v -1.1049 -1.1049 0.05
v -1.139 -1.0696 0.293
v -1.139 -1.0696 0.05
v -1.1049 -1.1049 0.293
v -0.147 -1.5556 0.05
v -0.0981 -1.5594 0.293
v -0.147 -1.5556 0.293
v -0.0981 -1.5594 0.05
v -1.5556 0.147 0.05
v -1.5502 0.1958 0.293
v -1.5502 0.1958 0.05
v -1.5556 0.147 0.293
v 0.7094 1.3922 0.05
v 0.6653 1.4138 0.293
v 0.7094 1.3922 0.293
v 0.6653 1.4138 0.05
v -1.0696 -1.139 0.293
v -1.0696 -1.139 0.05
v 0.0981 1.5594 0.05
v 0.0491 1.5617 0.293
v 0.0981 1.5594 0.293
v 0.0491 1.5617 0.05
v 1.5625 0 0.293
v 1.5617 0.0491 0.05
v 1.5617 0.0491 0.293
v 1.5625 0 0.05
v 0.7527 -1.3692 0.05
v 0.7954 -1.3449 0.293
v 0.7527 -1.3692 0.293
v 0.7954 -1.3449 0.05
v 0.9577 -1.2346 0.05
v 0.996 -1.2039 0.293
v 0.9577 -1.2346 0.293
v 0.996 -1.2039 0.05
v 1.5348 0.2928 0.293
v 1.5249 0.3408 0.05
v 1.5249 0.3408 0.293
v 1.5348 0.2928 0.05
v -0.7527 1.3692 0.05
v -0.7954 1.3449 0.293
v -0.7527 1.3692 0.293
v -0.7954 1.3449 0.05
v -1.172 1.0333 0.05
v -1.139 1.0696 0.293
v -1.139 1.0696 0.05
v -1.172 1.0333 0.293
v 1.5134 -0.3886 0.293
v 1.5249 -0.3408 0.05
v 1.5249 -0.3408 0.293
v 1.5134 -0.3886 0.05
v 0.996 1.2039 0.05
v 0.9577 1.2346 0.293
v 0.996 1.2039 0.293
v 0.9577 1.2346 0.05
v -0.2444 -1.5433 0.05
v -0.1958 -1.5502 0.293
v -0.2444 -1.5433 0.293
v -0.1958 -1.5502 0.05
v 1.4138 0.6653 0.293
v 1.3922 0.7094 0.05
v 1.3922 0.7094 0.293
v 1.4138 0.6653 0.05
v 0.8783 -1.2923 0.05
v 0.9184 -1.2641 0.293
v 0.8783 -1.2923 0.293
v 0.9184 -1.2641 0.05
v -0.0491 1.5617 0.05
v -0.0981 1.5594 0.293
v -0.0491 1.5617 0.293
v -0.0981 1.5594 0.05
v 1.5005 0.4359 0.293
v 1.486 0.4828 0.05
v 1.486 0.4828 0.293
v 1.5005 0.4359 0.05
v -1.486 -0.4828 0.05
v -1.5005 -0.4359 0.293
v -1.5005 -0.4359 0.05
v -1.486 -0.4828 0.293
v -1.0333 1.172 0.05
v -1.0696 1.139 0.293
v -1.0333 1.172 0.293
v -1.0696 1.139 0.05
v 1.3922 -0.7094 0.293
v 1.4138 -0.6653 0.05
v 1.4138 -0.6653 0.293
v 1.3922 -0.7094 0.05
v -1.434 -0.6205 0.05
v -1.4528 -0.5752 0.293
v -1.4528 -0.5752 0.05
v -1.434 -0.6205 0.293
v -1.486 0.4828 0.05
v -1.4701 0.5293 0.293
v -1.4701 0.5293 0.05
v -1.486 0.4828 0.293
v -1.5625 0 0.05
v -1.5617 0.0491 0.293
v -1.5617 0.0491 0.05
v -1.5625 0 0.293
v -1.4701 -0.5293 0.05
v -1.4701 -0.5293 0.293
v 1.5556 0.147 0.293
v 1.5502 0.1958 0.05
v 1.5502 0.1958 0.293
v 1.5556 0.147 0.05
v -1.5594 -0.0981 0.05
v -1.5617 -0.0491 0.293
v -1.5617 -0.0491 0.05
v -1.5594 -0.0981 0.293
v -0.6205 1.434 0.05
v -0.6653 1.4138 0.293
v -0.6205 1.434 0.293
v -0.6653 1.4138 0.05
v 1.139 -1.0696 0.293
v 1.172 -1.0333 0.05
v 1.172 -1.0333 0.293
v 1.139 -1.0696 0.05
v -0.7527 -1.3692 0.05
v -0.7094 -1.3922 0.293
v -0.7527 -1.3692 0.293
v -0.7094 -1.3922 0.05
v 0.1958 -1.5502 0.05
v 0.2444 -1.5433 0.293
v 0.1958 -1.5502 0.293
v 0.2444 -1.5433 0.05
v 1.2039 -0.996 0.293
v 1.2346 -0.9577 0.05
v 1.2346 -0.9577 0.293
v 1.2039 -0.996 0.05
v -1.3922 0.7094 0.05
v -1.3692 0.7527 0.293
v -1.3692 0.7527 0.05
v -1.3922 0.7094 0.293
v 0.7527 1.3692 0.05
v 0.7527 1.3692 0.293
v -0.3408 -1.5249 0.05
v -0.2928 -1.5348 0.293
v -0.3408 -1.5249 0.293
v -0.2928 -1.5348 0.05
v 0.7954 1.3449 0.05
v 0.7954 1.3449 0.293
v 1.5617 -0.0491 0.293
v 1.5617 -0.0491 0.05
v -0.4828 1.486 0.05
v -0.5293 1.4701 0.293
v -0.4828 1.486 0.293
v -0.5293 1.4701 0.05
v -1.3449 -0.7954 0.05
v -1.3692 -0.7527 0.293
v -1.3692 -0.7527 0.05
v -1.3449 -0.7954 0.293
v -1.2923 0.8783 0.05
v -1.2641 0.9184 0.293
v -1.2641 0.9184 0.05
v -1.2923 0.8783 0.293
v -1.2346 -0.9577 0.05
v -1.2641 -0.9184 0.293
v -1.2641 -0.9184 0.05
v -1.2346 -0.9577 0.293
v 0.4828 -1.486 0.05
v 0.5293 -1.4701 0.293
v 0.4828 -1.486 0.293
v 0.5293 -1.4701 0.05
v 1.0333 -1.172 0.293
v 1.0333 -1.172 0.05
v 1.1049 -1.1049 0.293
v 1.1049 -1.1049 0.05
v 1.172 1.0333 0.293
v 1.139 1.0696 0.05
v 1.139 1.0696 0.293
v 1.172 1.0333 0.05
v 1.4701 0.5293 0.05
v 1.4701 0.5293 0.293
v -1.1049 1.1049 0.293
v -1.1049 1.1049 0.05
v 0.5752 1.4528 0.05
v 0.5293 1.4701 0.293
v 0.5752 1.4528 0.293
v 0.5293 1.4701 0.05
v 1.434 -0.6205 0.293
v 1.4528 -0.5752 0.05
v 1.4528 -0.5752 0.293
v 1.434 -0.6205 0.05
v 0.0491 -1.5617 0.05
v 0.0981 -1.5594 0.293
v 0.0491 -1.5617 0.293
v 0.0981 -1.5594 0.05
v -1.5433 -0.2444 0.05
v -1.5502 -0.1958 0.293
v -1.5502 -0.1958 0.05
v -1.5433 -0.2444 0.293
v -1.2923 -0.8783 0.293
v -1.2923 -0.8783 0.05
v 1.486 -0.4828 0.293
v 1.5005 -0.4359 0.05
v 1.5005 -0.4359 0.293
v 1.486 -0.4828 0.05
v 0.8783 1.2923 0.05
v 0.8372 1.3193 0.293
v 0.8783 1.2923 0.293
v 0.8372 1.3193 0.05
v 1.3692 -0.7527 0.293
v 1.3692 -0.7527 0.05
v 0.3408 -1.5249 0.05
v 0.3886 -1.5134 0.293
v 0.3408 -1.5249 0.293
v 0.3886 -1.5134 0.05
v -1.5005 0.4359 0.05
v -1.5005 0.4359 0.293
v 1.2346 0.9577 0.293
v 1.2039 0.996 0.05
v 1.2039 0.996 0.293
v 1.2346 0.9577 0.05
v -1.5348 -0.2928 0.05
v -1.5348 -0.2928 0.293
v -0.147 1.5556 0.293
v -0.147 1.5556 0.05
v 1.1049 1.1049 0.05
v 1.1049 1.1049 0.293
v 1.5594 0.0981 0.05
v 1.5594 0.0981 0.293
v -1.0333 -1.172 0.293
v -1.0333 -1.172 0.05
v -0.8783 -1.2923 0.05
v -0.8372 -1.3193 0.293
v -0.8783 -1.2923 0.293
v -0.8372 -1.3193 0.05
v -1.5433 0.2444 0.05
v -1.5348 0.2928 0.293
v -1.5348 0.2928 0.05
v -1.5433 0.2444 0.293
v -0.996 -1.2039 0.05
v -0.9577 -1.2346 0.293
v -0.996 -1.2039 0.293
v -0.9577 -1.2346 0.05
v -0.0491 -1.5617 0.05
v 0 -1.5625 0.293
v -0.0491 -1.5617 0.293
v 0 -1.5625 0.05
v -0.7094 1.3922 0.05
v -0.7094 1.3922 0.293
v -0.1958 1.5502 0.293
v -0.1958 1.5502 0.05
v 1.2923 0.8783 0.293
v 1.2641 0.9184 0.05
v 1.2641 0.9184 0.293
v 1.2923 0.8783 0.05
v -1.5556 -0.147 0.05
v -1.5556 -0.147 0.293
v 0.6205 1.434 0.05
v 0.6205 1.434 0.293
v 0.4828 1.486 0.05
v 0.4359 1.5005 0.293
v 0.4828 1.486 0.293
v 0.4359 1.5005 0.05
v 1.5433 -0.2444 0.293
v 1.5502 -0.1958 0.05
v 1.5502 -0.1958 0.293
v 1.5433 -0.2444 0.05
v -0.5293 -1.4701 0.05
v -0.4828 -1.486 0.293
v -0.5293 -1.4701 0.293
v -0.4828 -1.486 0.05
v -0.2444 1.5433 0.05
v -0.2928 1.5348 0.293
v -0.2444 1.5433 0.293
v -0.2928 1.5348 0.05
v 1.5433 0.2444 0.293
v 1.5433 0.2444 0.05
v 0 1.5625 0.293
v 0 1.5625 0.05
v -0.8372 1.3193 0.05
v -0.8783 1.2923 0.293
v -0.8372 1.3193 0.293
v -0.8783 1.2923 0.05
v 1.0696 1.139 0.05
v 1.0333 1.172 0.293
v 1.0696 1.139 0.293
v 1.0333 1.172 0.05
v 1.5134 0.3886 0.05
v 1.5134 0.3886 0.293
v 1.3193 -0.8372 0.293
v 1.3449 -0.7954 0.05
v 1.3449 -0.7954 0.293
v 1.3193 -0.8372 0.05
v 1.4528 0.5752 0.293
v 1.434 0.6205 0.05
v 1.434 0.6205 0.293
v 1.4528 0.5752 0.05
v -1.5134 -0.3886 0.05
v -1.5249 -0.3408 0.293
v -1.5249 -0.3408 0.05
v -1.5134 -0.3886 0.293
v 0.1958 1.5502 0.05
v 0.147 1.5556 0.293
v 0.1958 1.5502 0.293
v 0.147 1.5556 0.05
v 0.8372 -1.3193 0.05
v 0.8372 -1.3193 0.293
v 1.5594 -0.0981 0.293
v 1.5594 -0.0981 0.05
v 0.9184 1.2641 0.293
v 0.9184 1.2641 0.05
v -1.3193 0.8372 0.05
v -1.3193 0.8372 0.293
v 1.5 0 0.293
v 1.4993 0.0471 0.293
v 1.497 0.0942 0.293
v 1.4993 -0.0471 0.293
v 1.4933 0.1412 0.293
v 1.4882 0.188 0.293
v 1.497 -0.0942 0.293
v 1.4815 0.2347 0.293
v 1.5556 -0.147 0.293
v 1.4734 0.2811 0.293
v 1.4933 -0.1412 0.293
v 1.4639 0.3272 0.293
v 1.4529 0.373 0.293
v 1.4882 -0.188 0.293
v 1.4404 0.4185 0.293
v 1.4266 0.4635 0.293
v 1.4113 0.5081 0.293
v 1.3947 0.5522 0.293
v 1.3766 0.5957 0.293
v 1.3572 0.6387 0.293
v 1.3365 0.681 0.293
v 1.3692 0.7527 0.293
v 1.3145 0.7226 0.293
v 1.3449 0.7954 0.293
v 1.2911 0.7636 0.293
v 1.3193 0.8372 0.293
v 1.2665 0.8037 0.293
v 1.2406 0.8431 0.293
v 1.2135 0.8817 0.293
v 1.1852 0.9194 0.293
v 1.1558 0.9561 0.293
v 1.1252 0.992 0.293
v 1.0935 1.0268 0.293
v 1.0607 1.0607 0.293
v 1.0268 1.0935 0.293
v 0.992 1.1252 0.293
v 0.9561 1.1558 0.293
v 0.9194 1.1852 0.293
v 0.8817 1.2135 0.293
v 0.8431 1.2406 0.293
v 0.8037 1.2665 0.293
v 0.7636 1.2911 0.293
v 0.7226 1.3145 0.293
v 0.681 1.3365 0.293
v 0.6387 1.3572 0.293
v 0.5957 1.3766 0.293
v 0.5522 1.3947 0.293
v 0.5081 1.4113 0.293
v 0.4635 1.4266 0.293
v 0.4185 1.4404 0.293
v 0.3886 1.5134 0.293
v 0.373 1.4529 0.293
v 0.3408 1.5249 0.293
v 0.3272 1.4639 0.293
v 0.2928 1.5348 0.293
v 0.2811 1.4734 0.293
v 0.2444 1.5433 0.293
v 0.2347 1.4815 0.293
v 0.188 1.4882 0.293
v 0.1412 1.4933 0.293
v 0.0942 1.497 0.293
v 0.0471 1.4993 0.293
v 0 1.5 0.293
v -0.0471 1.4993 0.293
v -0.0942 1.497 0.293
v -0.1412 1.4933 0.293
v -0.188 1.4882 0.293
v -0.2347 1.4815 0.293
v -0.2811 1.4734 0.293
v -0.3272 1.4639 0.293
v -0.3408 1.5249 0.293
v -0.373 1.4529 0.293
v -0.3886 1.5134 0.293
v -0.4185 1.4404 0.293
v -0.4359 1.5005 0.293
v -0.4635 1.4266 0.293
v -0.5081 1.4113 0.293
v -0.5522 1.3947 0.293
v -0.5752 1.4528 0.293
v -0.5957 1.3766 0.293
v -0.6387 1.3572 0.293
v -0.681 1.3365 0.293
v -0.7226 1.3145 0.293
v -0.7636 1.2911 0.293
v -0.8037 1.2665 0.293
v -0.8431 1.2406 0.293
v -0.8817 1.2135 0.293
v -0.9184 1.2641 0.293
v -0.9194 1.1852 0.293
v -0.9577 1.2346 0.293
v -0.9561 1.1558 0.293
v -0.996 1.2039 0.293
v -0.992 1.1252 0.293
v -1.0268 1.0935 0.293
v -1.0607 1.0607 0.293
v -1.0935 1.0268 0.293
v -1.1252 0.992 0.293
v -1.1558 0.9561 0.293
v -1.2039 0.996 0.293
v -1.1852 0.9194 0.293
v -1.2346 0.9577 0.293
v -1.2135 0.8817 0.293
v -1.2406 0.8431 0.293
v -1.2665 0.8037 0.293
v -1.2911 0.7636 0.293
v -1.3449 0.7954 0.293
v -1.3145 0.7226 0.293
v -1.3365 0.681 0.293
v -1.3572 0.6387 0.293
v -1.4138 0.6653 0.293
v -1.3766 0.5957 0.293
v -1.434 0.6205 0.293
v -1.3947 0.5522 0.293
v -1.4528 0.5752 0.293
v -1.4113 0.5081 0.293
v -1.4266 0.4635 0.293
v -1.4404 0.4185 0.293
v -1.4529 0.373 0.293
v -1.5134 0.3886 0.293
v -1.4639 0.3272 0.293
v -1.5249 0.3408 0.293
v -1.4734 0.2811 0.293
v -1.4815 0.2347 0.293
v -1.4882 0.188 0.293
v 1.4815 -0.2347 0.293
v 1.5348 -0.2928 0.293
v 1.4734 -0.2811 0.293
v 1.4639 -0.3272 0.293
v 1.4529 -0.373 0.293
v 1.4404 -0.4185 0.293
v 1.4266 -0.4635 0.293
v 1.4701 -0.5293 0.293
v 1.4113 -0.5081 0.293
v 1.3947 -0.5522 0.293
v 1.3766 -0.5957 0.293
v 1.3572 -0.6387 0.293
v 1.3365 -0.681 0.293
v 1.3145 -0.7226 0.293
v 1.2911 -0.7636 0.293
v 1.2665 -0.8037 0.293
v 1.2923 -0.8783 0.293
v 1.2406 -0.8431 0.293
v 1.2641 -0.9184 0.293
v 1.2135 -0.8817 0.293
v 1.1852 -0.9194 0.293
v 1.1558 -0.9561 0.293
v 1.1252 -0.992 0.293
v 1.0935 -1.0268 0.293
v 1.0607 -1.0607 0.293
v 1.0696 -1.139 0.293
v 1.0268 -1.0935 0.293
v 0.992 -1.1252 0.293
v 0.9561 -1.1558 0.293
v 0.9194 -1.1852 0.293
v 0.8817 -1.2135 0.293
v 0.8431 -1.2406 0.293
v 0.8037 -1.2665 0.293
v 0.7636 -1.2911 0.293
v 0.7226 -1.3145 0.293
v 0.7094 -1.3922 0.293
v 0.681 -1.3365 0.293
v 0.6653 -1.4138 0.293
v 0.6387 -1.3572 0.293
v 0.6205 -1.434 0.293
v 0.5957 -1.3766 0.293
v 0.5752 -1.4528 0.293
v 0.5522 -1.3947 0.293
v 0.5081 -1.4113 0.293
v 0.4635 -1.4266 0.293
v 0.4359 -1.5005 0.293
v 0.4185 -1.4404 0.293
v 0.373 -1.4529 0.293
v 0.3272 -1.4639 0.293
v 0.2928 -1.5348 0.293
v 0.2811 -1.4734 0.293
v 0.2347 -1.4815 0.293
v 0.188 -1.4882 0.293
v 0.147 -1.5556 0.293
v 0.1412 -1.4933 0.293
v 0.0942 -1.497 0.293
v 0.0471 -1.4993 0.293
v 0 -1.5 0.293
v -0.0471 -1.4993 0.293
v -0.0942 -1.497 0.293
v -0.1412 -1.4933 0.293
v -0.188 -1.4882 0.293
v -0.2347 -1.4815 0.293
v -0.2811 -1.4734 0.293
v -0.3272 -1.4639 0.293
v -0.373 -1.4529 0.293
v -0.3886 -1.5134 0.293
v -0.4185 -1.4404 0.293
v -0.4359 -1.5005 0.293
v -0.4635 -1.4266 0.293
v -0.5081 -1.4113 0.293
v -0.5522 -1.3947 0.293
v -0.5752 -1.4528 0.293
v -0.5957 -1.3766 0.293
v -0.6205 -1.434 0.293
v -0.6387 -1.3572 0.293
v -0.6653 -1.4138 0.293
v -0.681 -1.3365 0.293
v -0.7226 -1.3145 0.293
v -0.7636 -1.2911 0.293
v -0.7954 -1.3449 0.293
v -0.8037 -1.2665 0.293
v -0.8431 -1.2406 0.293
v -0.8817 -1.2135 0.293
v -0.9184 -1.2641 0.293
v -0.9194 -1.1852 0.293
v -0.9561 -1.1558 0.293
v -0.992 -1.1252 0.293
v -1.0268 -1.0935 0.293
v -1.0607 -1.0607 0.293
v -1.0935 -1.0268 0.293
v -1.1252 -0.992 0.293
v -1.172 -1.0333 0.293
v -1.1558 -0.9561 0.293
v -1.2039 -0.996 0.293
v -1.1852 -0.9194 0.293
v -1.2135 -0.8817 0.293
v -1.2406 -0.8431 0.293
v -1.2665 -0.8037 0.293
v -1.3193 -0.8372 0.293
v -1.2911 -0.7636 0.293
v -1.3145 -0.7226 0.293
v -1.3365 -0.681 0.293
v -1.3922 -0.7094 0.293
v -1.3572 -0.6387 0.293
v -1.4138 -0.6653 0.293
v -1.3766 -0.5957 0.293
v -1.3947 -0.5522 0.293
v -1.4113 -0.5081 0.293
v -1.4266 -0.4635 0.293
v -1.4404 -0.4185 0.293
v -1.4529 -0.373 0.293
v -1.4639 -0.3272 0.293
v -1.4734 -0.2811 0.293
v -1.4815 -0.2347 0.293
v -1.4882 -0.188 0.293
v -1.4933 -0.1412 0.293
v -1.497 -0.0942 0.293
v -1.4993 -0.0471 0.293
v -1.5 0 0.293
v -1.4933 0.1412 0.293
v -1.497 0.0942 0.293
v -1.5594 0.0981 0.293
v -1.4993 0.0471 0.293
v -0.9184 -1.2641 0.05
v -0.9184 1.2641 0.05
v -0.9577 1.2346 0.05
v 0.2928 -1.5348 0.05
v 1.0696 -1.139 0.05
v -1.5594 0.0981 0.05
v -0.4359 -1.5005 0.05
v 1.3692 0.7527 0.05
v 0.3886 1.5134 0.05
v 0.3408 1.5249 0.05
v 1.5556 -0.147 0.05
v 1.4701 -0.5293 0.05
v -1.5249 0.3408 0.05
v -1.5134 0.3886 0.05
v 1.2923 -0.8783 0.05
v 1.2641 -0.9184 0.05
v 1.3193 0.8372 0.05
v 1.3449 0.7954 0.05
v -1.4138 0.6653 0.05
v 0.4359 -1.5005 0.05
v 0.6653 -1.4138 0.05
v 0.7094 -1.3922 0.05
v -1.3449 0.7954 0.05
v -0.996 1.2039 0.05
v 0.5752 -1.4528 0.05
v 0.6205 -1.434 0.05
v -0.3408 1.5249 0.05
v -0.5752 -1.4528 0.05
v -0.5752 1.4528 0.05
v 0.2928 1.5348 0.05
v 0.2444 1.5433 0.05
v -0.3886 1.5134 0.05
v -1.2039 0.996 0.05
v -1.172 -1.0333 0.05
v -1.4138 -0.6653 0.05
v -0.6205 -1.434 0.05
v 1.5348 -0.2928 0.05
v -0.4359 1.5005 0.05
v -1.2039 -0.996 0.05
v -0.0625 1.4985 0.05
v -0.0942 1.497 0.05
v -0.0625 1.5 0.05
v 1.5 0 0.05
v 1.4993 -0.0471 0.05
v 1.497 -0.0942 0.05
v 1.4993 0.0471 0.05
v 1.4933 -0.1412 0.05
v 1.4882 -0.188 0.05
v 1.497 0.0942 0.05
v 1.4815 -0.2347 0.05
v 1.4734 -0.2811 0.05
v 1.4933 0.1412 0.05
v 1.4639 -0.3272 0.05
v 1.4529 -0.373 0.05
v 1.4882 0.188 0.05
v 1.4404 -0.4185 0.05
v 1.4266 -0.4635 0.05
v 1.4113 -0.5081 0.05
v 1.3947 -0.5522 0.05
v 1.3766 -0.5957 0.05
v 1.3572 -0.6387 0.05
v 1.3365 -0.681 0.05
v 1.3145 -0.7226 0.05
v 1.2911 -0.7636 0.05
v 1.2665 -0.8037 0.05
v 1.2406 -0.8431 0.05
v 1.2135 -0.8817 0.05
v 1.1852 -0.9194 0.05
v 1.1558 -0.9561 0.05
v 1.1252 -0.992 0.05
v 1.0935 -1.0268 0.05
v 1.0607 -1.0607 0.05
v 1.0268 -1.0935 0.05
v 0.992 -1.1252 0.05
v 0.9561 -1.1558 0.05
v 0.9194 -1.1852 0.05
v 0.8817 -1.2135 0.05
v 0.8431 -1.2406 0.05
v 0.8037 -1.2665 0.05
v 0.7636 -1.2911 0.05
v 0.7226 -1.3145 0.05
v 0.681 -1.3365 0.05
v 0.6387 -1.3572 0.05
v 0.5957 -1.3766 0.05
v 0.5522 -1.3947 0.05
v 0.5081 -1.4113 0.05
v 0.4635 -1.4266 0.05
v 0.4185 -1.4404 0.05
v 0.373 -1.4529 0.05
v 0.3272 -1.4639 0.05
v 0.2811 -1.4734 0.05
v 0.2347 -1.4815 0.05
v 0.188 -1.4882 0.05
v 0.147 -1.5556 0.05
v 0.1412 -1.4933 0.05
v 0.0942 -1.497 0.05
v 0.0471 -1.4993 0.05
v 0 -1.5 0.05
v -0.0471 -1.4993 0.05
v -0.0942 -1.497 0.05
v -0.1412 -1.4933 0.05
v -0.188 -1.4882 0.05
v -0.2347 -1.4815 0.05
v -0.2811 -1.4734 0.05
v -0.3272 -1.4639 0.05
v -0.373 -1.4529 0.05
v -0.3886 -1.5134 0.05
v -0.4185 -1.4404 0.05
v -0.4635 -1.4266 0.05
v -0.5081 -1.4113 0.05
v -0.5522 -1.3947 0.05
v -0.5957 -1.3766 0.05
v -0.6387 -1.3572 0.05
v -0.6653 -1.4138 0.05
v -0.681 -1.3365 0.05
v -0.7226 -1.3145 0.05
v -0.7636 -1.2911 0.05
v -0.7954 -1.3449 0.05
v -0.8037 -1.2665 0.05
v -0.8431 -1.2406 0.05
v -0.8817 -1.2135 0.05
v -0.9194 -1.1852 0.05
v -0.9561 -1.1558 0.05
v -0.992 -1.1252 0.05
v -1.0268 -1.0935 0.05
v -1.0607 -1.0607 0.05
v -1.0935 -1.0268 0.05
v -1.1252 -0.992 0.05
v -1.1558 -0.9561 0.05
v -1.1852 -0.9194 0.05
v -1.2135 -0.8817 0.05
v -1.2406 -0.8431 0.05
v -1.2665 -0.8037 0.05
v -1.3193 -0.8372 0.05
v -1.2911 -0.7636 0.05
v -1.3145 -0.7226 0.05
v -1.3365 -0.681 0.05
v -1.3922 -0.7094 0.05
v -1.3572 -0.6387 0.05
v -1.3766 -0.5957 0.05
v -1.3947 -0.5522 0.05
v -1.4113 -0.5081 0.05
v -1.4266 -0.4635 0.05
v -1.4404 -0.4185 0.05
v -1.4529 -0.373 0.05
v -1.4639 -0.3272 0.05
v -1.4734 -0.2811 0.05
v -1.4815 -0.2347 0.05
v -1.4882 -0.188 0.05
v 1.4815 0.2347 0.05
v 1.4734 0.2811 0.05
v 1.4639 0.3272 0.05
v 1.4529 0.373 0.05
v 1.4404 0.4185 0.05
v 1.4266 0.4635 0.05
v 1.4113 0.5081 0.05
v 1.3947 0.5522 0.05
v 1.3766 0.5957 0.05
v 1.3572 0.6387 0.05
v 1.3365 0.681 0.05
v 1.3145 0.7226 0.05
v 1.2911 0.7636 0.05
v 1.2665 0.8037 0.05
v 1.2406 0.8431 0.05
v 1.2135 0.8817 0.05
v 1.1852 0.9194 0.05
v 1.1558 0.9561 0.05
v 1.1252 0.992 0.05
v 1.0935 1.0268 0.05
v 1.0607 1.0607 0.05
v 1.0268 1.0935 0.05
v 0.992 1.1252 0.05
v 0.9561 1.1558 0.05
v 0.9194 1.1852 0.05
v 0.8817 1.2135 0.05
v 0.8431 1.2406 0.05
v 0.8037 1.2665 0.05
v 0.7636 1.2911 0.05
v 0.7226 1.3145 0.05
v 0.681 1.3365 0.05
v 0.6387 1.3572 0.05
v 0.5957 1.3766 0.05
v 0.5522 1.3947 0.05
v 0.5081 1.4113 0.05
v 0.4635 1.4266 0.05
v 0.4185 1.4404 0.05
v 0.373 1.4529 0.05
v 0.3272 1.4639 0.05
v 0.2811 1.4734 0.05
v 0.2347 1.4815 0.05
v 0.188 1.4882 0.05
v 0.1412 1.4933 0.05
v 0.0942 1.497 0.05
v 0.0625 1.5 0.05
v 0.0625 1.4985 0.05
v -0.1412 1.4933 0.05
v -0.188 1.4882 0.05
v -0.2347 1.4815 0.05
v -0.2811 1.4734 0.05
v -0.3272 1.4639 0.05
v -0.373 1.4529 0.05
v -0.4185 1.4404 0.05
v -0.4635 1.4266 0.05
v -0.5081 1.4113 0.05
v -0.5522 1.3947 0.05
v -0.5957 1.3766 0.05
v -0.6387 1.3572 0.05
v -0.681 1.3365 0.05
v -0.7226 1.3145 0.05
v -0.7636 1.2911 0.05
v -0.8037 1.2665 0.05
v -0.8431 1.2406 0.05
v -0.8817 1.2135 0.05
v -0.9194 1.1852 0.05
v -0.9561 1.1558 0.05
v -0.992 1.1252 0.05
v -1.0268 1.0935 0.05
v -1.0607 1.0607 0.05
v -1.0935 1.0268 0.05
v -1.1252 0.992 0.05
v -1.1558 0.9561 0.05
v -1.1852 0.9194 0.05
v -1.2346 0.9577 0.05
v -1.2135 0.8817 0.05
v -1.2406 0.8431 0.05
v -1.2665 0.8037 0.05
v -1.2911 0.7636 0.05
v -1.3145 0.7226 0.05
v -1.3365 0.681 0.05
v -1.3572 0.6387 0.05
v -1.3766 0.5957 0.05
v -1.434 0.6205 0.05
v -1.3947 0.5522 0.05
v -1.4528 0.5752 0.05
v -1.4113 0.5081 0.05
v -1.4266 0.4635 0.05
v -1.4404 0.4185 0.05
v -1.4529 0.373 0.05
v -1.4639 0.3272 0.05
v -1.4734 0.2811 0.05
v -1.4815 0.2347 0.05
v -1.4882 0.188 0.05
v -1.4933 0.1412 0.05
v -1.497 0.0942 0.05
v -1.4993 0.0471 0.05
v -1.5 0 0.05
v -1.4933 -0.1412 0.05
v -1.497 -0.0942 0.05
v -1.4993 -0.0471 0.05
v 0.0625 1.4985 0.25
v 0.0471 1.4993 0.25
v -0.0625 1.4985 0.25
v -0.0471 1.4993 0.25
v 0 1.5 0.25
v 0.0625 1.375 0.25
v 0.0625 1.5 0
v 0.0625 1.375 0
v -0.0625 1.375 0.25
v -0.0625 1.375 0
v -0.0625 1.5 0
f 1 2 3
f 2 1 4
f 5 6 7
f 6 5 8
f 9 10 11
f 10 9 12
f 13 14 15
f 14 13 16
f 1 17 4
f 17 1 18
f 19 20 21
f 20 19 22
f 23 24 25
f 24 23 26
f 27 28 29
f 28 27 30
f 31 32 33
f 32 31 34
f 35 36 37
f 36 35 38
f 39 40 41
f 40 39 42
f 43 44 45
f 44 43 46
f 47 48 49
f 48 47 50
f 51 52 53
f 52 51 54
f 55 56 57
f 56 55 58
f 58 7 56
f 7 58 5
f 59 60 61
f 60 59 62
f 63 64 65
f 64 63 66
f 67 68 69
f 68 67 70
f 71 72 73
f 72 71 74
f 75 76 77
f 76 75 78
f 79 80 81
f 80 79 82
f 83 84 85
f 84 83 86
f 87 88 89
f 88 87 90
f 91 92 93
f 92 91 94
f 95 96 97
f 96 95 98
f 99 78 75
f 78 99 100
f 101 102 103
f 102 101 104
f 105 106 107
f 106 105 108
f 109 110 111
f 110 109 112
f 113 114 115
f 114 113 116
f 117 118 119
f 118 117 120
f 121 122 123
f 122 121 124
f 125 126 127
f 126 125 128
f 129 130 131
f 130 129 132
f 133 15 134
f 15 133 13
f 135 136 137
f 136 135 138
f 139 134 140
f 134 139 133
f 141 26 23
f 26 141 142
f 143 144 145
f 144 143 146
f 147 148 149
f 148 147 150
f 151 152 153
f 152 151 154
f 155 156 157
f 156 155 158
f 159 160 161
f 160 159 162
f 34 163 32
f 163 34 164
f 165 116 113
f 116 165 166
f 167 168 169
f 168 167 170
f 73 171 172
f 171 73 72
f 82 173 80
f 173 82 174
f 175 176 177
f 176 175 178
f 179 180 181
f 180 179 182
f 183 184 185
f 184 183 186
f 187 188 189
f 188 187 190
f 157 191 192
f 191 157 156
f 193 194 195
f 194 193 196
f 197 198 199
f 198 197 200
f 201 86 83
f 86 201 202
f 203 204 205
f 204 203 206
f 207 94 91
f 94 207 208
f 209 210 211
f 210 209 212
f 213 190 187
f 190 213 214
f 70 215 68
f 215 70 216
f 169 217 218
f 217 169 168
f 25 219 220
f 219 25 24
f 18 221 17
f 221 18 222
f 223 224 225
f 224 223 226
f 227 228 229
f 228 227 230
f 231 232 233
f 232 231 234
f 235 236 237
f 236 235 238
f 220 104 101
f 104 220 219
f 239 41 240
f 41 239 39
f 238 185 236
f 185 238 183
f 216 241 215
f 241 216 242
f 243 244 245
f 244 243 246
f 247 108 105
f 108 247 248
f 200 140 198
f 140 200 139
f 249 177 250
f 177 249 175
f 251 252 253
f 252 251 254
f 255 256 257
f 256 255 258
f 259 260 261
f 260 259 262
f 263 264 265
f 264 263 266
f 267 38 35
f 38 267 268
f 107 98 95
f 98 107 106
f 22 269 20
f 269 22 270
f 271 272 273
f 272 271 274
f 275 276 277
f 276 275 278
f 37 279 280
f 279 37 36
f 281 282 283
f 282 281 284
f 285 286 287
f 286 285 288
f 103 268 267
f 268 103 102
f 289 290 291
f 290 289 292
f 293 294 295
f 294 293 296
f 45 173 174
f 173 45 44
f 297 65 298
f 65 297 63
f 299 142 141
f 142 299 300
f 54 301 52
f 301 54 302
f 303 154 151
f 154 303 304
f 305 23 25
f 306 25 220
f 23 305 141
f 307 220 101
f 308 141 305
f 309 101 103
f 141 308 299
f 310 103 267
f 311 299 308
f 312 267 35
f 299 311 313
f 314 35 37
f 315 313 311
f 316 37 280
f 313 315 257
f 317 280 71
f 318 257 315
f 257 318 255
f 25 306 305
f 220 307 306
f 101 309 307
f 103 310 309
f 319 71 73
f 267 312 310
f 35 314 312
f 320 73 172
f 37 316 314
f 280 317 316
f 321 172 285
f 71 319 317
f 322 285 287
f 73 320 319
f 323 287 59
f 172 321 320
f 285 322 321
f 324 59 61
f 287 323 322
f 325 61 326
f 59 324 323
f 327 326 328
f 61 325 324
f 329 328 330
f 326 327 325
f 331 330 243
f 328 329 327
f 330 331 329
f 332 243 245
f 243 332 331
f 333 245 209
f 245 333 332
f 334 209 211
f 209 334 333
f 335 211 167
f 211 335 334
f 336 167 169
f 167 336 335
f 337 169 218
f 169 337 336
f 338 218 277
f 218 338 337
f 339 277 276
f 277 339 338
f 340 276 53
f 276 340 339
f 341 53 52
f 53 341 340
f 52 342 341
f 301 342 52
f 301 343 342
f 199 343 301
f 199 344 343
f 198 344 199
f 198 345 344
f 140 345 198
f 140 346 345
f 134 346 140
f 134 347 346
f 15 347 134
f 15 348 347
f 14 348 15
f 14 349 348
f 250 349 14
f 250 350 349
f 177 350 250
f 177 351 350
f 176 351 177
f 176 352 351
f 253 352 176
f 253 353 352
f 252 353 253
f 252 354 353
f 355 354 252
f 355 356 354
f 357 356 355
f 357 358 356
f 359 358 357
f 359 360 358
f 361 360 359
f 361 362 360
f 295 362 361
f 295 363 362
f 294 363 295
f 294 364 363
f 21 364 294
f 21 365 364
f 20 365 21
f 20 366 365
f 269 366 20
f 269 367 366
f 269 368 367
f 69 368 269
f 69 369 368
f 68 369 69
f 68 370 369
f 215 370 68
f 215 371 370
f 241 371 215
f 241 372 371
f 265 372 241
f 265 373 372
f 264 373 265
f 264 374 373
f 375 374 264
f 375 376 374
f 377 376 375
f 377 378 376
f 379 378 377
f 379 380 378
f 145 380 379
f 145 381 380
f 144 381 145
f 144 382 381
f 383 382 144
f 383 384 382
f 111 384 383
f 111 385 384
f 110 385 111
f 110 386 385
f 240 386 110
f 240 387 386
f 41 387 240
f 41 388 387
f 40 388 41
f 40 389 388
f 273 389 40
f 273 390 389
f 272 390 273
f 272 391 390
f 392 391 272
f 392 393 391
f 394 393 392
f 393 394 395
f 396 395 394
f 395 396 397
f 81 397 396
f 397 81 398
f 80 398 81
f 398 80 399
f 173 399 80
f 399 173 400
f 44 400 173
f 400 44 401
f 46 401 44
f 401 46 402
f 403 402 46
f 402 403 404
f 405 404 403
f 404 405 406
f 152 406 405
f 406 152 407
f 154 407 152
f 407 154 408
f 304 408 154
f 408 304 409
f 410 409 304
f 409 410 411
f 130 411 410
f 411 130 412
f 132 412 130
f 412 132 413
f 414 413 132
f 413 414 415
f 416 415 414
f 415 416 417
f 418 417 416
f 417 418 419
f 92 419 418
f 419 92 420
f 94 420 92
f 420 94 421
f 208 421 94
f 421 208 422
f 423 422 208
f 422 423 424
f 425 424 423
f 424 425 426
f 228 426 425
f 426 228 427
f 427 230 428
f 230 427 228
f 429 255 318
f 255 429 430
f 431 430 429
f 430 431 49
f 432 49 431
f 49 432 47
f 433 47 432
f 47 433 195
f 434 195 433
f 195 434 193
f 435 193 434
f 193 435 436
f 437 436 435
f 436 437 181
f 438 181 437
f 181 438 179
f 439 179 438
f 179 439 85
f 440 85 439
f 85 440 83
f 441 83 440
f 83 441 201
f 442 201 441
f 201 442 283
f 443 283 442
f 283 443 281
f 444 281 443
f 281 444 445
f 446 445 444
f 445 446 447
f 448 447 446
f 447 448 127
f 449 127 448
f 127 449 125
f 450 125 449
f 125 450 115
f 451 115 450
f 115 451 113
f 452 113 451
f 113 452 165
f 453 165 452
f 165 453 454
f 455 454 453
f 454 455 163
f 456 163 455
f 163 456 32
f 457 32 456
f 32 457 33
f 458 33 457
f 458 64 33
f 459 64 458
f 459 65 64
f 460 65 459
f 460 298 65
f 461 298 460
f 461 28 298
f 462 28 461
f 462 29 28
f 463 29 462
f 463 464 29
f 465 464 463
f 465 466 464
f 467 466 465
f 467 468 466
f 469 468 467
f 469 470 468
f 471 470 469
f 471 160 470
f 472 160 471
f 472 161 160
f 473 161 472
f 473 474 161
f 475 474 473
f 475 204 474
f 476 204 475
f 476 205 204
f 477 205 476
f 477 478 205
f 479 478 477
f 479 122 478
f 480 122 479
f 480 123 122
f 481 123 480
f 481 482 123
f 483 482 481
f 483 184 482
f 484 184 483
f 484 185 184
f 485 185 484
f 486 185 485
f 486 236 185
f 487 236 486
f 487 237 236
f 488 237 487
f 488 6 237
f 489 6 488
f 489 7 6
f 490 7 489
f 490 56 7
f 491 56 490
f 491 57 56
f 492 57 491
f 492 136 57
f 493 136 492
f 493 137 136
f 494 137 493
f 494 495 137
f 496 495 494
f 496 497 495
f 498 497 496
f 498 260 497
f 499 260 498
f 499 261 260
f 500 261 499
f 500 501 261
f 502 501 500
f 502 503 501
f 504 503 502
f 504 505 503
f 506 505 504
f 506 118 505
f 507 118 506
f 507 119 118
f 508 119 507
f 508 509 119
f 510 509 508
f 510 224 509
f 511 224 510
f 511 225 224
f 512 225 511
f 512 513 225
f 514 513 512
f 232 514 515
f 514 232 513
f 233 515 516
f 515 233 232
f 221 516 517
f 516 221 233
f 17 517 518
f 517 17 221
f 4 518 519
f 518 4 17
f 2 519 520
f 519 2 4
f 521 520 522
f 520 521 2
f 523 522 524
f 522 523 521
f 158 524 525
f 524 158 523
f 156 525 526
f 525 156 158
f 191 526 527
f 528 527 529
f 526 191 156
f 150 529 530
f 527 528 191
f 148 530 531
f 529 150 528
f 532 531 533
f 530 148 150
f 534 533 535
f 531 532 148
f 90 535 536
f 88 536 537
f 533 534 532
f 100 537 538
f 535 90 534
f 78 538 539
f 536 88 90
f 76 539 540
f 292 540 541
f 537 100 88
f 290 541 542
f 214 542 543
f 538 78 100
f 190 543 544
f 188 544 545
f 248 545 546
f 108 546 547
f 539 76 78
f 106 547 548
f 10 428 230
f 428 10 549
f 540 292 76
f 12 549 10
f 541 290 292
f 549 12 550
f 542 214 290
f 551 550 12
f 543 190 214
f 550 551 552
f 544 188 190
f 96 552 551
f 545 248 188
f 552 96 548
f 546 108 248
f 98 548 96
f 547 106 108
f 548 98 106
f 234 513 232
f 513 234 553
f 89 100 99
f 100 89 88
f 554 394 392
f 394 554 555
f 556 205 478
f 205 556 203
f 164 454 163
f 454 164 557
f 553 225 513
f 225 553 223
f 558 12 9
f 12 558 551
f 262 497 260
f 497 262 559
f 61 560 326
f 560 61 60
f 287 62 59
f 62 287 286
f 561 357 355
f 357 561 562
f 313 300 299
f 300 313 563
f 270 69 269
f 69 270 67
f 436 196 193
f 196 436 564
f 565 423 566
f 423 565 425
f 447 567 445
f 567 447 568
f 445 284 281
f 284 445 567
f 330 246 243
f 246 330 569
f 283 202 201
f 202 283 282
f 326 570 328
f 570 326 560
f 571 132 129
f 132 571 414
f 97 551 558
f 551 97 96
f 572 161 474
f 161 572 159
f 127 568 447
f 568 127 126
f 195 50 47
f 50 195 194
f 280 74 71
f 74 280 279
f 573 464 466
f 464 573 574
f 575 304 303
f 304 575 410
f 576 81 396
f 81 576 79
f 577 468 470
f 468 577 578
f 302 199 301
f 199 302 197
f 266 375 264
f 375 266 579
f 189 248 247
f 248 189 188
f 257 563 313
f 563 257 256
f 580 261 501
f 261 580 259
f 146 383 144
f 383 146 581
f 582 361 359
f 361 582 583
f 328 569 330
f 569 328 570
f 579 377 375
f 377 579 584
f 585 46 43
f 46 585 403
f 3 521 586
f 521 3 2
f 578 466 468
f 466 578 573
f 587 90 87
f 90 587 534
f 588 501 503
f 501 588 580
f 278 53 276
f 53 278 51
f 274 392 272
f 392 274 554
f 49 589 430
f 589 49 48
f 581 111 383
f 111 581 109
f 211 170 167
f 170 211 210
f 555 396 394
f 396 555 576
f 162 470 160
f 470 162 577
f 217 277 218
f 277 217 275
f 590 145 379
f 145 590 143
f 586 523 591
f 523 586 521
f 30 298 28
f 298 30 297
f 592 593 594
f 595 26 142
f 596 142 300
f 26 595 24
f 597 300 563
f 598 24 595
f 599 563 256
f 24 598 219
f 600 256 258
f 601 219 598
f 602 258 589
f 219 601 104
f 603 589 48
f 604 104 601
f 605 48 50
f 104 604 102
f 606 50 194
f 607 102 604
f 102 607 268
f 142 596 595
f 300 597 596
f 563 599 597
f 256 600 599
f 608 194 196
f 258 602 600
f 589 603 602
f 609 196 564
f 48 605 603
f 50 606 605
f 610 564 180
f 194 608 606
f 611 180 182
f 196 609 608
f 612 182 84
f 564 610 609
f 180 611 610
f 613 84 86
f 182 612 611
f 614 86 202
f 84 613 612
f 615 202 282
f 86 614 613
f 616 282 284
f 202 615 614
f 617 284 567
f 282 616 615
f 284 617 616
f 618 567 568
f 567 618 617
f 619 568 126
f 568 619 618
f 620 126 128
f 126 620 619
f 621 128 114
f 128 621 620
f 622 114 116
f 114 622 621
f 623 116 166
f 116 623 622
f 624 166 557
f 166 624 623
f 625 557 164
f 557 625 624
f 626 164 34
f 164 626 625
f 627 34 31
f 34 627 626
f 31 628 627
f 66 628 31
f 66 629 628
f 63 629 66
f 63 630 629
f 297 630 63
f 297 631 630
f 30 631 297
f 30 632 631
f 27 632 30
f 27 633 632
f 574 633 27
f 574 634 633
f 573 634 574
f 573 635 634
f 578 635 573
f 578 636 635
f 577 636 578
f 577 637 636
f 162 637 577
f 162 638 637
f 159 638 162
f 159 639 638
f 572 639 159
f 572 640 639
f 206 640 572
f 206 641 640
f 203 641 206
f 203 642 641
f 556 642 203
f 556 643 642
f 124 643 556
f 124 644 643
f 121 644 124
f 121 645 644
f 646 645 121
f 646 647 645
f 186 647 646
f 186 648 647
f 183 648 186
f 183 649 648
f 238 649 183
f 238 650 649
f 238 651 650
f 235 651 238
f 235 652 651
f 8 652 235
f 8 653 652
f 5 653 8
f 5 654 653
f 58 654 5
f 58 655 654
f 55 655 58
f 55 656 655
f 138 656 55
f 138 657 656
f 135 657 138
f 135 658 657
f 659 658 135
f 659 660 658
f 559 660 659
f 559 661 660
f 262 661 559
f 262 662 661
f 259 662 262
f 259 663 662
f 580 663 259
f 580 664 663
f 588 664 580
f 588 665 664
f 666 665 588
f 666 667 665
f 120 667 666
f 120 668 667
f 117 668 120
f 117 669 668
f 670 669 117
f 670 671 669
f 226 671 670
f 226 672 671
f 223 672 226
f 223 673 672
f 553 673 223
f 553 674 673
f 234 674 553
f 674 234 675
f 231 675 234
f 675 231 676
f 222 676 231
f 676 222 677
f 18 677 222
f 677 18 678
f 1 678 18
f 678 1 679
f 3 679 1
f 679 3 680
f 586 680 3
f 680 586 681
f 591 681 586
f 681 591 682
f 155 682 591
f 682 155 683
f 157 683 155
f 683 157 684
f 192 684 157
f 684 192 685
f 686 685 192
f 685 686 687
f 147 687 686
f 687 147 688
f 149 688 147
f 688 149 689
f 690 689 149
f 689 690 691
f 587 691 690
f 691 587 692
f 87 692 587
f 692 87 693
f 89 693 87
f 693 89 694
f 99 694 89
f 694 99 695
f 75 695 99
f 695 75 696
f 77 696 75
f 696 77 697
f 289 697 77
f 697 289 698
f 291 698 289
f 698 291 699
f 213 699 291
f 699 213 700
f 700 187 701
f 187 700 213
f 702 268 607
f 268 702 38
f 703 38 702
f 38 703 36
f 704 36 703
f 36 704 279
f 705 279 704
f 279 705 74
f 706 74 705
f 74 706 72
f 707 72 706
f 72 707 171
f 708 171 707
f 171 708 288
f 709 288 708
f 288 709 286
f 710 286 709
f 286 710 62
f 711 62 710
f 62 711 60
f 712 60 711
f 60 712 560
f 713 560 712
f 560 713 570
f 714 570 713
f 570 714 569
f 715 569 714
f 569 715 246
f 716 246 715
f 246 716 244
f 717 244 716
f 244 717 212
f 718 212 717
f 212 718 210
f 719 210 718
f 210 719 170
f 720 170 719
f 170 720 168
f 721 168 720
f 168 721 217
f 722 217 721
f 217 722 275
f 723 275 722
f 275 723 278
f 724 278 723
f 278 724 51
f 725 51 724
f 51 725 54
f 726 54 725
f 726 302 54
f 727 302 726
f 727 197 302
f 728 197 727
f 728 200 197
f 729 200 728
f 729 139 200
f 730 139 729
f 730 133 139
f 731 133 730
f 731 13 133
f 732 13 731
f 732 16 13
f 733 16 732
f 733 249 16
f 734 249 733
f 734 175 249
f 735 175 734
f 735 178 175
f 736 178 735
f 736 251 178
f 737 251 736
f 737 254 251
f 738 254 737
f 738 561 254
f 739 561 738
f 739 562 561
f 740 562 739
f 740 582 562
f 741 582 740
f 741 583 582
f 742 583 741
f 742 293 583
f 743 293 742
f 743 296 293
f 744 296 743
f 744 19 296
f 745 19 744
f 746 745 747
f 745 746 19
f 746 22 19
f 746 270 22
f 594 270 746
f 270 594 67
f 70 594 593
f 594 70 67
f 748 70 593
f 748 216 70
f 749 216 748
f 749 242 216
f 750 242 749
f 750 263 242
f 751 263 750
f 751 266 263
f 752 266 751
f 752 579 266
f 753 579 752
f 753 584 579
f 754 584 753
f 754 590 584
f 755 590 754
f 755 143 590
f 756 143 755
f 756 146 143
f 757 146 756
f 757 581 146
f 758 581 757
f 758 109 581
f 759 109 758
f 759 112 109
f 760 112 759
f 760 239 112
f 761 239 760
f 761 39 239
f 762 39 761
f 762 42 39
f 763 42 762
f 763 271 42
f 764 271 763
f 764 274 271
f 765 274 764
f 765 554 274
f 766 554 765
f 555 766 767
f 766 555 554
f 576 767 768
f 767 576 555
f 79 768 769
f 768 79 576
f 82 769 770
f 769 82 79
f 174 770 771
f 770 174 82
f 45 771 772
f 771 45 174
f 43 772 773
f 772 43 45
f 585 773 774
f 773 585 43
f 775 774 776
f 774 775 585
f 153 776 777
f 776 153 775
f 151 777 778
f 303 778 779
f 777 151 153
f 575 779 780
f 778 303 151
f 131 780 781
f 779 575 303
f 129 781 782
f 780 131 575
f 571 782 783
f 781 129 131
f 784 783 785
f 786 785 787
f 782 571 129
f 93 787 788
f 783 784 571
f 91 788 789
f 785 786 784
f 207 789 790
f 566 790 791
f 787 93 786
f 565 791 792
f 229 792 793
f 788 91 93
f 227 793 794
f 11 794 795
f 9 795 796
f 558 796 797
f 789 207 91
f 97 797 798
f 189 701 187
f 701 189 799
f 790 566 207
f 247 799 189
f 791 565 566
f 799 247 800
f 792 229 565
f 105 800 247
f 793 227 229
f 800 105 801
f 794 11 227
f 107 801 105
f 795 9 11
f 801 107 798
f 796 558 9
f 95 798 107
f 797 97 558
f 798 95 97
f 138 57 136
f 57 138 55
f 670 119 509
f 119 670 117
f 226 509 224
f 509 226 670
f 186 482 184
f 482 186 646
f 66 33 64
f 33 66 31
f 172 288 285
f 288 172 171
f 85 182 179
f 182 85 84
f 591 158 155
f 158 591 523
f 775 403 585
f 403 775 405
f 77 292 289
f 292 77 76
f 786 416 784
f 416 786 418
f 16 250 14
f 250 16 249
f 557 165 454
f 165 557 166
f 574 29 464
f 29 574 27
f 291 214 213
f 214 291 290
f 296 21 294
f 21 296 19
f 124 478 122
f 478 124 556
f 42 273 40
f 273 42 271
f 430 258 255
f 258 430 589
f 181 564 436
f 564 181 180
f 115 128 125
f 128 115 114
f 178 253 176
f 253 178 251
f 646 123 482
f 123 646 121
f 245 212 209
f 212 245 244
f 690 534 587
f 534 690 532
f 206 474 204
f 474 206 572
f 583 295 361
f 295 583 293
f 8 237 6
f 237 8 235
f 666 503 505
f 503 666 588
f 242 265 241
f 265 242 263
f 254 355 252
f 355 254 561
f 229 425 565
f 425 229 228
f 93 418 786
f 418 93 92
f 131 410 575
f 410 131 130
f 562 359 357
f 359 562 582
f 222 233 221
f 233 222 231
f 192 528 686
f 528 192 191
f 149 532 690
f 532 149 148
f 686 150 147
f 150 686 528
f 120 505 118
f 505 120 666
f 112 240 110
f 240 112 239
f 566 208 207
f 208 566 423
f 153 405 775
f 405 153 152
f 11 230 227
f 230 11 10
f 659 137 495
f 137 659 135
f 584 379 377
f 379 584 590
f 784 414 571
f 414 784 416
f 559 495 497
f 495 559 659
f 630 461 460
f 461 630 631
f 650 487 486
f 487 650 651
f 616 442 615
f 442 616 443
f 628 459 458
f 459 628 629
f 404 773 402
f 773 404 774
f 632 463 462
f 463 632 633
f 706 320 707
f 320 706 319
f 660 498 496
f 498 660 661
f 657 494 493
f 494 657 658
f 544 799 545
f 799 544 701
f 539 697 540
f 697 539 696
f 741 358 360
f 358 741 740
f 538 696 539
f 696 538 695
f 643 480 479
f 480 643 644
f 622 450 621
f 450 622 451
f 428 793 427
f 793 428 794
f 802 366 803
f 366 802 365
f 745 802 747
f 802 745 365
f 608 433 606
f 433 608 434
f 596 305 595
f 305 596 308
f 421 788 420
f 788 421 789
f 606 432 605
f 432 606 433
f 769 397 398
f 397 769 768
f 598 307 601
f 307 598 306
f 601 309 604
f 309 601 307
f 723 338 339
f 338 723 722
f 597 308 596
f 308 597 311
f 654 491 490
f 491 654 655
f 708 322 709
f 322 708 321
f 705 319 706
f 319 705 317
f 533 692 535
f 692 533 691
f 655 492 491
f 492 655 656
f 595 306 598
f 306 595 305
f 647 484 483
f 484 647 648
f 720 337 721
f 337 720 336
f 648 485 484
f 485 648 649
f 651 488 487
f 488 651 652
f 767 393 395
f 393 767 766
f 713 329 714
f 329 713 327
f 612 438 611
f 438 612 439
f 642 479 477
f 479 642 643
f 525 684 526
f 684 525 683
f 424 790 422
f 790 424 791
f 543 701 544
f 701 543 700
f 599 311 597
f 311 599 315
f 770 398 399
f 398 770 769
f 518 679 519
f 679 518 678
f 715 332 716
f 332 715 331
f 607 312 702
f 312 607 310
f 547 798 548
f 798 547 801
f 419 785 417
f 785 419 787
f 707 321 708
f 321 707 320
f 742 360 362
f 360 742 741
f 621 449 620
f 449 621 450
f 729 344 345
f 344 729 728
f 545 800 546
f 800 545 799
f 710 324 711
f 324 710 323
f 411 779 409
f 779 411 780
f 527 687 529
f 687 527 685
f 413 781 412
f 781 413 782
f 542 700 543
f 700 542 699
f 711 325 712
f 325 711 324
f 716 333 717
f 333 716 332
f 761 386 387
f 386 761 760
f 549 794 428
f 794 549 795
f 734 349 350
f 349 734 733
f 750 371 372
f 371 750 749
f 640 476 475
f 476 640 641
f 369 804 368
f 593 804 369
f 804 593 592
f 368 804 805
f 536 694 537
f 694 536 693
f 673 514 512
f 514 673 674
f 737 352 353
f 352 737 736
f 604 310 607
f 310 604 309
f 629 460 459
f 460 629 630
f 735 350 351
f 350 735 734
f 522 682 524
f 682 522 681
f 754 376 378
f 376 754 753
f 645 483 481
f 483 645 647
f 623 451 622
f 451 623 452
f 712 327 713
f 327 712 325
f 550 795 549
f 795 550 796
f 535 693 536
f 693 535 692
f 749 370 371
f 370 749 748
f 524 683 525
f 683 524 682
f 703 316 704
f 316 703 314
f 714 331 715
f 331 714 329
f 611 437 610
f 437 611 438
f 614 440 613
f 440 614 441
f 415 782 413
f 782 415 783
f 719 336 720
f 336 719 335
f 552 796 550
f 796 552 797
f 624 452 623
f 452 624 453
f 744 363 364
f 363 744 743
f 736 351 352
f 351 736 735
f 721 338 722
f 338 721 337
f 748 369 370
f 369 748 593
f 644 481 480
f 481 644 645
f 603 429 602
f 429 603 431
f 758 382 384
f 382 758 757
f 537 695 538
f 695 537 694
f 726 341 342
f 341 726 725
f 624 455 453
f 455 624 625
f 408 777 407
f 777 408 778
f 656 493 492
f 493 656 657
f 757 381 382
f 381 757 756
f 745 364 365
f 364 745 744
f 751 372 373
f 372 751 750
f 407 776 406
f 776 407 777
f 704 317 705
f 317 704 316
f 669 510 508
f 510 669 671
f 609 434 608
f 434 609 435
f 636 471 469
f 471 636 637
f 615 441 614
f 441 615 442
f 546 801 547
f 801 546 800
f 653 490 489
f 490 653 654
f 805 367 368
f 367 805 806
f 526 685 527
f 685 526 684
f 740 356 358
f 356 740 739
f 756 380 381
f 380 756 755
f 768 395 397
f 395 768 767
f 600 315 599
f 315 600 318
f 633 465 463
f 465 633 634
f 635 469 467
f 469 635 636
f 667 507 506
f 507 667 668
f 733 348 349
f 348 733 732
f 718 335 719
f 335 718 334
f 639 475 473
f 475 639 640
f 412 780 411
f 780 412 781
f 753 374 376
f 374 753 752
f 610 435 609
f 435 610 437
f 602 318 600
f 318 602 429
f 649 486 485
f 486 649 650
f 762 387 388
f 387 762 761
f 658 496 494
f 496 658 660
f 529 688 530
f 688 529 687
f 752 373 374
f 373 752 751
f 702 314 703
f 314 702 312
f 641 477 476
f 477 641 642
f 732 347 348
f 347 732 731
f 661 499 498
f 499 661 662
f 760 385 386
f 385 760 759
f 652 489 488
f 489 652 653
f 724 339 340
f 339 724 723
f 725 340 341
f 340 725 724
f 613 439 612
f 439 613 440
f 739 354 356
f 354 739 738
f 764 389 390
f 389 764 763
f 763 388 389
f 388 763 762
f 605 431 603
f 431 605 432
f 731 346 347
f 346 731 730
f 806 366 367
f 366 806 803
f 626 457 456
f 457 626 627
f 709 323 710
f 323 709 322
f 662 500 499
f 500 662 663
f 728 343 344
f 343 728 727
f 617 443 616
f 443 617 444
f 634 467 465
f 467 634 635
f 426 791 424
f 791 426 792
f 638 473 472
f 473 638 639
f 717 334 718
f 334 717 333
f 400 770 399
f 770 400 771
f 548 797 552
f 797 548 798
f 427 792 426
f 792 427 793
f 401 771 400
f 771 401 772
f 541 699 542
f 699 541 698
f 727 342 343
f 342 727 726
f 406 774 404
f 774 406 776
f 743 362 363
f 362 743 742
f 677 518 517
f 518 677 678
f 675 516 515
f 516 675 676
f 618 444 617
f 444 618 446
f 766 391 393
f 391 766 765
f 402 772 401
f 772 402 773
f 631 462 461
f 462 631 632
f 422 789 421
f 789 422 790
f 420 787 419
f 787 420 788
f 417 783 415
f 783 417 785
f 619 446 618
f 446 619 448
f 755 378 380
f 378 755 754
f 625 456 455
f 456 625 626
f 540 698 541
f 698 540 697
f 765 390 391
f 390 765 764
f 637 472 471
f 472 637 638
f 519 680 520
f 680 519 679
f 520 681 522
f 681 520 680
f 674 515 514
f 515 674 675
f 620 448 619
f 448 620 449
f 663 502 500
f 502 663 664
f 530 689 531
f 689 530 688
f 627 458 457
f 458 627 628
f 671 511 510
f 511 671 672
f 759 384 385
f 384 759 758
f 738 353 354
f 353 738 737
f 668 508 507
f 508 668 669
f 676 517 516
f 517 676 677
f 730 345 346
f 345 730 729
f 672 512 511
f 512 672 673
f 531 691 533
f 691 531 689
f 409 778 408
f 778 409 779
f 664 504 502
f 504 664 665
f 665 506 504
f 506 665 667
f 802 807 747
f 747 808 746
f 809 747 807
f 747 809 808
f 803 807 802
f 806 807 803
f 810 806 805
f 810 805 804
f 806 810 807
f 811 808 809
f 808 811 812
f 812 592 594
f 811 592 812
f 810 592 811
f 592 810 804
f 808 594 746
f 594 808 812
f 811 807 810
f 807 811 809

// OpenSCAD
module FlatHead(x, y, z)
{
  translate([x,y,z-0.085])
    union() {
      cylinder(h = 0.200, d1 = 0.125, d2 = 0.350, center = false, $fn = 100);
      translate([0, 0, -0.200])
        cylinder(h = 0.300, d = 0.125, center = false, $fn = 100);
  }
}

union() {
  difference() {
    linear_extrude(height = 0.200, center = false, convexity = 10, slices = 10)
       import(file = "FlangeAOutline2.dxf");

    // cut center hole
    cylinder (h = 0.5, d=3.000, center=true, $fn = 250);

    // add mounting holes
    translate([1.25, 1.25, 0])
       cylinder(h = 0.5, d = 0.188, center = true, $fn = 40);
    translate([-1.25, 1.25, 0])
       cylinder(h = 0.5, d = 0.188, center = true, $fn = 40);
    translate([1.25, -1.25, 0])
       cylinder(h = 0.5, d = 0.188, center = true, $fn = 40);
    translate([-1.25, -1.25, 0])
       cylinder(h = 0.5, d = 0.188, center = true, $fn = 40);

    // Add assembly screw holes
    FlatHead( 1, 2.75/2, 0.175);
    FlatHead(-1, 2.75/2, 0.175);
    FlatHead(1, -2.75/2, 0.175);
    FlatHead(-1, -2.75/2, 0.175);
    FlatHead(2.75/2, 1, 0.175);
    FlatHead(-2.75/2, 1, 0.175);
    FlatHead(2.75/2, -1, 0.175);
    FlatHead(-2.75/2, -1, 0.175);

  }

  // rim for rear mount
  translate([0, 0, 0.05])
    difference() {
      cylinder (h = 0.293 - 0.05, d=3.125, center = false, $fn = 200);
      cylinder (h = 0.5, d=3.000, center = true, $fn = 200);
  }

  // Add alignment notch
  translate([0, 3.000/2 - 0.125/2, 0.125])
    cube([0.125, 0.125, 0.250], center = true);

}
